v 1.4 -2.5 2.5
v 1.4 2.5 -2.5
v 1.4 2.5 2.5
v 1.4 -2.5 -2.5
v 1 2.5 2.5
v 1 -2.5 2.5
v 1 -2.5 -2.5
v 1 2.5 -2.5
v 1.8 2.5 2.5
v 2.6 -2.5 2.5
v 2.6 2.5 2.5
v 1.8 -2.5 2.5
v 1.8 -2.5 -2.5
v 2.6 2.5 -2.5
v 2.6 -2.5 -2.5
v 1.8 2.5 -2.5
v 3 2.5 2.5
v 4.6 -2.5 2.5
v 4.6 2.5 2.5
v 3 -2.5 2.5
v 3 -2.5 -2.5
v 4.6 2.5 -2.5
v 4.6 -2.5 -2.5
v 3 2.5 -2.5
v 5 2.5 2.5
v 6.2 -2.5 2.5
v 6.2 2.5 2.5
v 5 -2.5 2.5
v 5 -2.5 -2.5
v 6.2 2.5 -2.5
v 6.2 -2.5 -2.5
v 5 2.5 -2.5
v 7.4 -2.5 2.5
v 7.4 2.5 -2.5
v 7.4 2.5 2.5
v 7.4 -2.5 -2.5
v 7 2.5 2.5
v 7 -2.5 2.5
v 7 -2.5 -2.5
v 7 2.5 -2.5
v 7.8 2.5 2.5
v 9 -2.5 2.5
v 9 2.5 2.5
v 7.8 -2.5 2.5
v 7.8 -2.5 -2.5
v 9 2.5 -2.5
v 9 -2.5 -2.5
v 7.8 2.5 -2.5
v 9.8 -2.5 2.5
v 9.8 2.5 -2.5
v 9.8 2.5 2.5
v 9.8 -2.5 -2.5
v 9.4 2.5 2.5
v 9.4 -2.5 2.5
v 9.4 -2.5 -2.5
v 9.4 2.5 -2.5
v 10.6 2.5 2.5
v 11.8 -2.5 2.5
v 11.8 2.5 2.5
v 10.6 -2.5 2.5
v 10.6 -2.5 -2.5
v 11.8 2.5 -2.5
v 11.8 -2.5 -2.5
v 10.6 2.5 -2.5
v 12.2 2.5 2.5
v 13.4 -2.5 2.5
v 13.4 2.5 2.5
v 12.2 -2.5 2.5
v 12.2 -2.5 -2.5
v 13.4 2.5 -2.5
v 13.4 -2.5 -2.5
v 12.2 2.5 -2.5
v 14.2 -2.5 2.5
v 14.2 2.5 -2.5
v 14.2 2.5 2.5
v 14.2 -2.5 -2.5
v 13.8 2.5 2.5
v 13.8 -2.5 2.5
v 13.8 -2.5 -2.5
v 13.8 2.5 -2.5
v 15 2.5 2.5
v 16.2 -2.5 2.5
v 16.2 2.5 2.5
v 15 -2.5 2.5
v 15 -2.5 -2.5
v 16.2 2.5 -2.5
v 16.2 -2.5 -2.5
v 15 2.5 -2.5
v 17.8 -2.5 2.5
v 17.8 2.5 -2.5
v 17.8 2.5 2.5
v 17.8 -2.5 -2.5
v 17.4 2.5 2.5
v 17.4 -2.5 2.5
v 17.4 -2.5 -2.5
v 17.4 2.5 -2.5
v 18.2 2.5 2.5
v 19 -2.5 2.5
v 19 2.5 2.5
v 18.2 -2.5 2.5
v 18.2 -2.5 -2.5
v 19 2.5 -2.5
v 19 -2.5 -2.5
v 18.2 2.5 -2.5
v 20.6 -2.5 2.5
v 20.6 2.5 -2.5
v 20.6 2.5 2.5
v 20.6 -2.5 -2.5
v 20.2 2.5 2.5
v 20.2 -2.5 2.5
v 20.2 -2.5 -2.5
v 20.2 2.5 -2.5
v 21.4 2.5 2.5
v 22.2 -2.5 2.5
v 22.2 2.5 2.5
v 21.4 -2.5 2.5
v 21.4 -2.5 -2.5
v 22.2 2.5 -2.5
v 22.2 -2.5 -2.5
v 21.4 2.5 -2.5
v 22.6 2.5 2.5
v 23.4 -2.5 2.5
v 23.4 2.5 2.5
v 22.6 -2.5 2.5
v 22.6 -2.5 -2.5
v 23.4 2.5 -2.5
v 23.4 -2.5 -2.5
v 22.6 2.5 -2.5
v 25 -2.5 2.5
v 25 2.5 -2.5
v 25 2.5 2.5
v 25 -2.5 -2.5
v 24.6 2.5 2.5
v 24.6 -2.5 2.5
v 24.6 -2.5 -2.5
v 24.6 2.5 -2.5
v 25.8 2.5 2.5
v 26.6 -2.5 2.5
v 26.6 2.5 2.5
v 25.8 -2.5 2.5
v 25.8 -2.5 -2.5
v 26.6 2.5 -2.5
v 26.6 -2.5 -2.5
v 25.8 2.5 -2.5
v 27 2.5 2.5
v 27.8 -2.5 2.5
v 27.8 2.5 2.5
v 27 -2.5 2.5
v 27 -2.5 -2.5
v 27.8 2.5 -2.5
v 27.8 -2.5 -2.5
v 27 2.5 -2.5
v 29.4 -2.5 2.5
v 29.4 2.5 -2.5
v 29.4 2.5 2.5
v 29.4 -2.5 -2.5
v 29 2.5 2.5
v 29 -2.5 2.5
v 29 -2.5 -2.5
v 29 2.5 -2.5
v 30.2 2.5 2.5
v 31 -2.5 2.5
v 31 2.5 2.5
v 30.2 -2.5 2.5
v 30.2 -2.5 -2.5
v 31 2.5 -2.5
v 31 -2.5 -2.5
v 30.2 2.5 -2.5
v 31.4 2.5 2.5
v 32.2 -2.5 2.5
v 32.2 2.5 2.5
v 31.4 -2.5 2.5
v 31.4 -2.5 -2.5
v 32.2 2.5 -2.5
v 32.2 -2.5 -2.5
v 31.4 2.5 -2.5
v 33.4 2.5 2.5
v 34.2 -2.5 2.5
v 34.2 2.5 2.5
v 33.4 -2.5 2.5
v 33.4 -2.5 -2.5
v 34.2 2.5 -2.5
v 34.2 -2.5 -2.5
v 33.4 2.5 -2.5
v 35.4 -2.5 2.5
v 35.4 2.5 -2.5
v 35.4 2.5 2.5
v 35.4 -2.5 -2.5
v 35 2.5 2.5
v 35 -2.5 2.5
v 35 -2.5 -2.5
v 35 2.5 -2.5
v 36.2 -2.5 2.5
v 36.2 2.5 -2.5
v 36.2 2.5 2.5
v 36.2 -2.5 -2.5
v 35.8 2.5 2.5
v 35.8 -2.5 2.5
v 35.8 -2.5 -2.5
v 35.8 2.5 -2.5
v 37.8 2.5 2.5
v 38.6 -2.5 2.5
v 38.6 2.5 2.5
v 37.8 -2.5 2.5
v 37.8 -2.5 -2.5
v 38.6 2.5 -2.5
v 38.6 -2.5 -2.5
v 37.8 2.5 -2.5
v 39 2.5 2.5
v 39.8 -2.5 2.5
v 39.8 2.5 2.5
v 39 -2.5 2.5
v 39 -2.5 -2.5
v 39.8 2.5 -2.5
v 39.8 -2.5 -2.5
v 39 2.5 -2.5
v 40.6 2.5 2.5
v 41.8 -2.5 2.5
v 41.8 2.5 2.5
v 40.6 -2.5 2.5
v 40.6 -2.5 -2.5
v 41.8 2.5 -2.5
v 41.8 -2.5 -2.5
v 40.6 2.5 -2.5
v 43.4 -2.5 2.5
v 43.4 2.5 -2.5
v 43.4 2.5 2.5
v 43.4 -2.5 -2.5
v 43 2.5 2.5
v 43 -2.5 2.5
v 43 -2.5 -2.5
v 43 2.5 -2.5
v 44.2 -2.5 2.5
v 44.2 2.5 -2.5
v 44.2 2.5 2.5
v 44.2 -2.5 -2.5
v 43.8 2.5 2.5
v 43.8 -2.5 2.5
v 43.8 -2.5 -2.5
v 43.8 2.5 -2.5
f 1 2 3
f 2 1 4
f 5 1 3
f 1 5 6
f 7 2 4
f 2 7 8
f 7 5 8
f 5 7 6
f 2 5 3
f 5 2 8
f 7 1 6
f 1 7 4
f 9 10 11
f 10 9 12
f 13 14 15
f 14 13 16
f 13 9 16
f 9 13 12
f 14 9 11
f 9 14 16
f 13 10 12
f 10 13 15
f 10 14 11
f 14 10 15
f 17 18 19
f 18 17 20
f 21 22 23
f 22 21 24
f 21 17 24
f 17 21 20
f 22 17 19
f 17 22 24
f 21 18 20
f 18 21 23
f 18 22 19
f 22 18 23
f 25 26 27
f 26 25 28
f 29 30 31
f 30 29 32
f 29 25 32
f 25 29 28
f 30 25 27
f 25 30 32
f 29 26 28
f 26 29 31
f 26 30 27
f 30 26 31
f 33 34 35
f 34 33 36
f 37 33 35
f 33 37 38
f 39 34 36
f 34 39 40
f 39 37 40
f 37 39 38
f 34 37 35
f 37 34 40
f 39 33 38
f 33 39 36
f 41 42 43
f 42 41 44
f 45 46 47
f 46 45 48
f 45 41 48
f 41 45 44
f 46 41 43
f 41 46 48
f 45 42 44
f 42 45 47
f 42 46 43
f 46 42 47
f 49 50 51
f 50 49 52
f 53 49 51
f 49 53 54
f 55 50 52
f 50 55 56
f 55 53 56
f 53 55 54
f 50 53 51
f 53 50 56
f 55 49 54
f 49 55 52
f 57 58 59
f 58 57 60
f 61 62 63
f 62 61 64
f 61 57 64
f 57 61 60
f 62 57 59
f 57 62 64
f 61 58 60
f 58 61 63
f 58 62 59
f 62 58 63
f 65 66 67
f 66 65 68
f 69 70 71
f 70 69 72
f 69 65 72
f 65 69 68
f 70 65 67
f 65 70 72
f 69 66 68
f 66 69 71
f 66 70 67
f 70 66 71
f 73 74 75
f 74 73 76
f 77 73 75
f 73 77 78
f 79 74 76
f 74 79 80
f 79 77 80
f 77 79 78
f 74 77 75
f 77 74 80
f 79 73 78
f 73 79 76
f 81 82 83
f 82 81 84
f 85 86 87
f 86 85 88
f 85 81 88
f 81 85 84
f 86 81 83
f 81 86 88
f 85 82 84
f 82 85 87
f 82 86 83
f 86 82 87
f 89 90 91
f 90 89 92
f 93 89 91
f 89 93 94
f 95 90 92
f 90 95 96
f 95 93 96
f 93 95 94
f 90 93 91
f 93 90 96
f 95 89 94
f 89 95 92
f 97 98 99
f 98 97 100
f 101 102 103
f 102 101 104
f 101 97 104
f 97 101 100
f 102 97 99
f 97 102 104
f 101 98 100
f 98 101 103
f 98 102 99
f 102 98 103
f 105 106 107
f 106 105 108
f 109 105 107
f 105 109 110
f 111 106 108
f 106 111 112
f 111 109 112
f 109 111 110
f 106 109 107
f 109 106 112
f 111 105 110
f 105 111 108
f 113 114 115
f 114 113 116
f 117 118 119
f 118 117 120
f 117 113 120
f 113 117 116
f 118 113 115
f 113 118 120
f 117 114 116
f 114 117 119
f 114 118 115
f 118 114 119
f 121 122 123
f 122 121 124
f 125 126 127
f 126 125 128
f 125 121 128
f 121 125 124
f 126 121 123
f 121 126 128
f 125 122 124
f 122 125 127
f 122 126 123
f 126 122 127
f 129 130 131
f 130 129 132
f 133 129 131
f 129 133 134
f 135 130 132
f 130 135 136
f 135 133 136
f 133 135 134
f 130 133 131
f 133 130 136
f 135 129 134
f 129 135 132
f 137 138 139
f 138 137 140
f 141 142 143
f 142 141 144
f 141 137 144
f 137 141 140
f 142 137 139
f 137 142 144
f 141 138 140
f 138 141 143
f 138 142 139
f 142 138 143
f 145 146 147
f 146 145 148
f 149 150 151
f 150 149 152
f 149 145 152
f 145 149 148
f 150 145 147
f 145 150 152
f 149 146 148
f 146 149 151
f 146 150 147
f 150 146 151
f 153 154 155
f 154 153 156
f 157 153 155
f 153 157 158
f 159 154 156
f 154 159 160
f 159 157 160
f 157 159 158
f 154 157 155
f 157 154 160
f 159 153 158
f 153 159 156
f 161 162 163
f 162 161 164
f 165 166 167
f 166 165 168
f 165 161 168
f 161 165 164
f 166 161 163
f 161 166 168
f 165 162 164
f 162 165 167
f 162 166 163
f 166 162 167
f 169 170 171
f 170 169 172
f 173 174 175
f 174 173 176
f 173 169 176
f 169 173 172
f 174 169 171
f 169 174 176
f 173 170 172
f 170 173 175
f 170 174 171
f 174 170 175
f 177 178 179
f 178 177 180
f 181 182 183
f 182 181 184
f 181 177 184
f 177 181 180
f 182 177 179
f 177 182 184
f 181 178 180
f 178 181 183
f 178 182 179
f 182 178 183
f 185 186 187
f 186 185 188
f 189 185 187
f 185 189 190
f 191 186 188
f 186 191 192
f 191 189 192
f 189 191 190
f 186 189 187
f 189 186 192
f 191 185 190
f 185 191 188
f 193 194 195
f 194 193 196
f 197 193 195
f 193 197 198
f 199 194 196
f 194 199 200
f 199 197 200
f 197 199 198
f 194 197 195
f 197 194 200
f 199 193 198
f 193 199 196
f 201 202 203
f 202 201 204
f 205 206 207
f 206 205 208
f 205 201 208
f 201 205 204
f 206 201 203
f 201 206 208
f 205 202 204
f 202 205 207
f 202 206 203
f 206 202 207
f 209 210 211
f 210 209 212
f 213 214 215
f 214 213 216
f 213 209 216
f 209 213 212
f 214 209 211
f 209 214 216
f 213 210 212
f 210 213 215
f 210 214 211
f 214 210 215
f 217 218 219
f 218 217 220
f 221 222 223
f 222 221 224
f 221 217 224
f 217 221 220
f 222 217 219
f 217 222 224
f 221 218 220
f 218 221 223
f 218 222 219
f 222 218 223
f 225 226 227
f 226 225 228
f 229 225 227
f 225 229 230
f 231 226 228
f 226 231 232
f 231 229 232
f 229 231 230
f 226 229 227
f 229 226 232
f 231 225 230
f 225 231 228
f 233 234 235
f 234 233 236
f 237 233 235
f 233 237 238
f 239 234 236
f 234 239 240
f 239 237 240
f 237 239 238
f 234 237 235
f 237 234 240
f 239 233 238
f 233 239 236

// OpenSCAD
translate([1.2,0,0])  cube(size = [0.4,5,5], center=true);
translate([2,0,0])  cube(size = [0.4,5,5], center=true);
translate([2.4,0,0])  cube(size = [0.4,5,5], center=true);
translate([3.2,0,0])  cube(size = [0.4,5,5], center=true);
translate([3.6,0,0])  cube(size = [0.4,5,5], center=true);
translate([4,0,0])  cube(size = [0.4,5,5], center=true);
translate([4.4,0,0])  cube(size = [0.4,5,5], center=true);
translate([5.2,0,0])  cube(size = [0.4,5,5], center=true);
translate([5.6,0,0])  cube(size = [0.4,5,5], center=true);
translate([6,0,0])  cube(size = [0.4,5,5], center=true);
translate([7.2,0,0])  cube(size = [0.4,5,5], center=true);
translate([8,0,0])  cube(size = [0.4,5,5], center=true);
translate([8.4,0,0])  cube(size = [0.4,5,5], center=true);
translate([8.8,0,0])  cube(size = [0.4,5,5], center=true);
translate([9.6,0,0])  cube(size = [0.4,5,5], center=true);
translate([10.8,0,0])  cube(size = [0.4,5,5], center=true);
translate([11.2,0,0])  cube(size = [0.4,5,5], center=true);
translate([11.6,0,0])  cube(size = [0.4,5,5], center=true);
translate([12.4,0,0])  cube(size = [0.4,5,5], center=true);
translate([12.8,0,0])  cube(size = [0.4,5,5], center=true);
translate([13.2,0,0])  cube(size = [0.4,5,5], center=true);
translate([14,0,0])  cube(size = [0.4,5,5], center=true);
translate([15.2,0,0])  cube(size = [0.4,5,5], center=true);
translate([15.6,0,0])  cube(size = [0.4,5,5], center=true);
translate([16,0,0])  cube(size = [0.4,5,5], center=true);
translate([17.6,0,0])  cube(size = [0.4,5,5], center=true);
translate([18.4,0,0])  cube(size = [0.4,5,5], center=true);
translate([18.8,0,0])  cube(size = [0.4,5,5], center=true);
translate([20.4,0,0])  cube(size = [0.4,5,5], center=true);
translate([21.6,0,0])  cube(size = [0.4,5,5], center=true);
translate([22,0,0])  cube(size = [0.4,5,5], center=true);
translate([22.8,0,0])  cube(size = [0.4,5,5], center=true);
translate([23.2,0,0])  cube(size = [0.4,5,5], center=true);
translate([24.8,0,0])  cube(size = [0.4,5,5], center=true);
translate([26,0,0])  cube(size = [0.4,5,5], center=true);
translate([26.4,0,0])  cube(size = [0.4,5,5], center=true);
translate([27.2,0,0])  cube(size = [0.4,5,5], center=true);
translate([27.6,0,0])  cube(size = [0.4,5,5], center=true);
translate([29.2,0,0])  cube(size = [0.4,5,5], center=true);
translate([30.4,0,0])  cube(size = [0.4,5,5], center=true);
translate([30.8,0,0])  cube(size = [0.4,5,5], center=true);
translate([31.6,0,0])  cube(size = [0.4,5,5], center=true);
translate([32,0,0])  cube(size = [0.4,5,5], center=true);
translate([33.6,0,0])  cube(size = [0.4,5,5], center=true);
translate([34,0,0])  cube(size = [0.4,5,5], center=true);
translate([35.2,0,0])  cube(size = [0.4,5,5], center=true);
translate([36,0,0])  cube(size = [0.4,5,5], center=true);
translate([38,0,0])  cube(size = [0.4,5,5], center=true);
translate([38.4,0,0])  cube(size = [0.4,5,5], center=true);
translate([39.2,0,0])  cube(size = [0.4,5,5], center=true);
translate([39.6,0,0])  cube(size = [0.4,5,5], center=true);
translate([40.8,0,0])  cube(size = [0.4,5,5], center=true);
translate([41.2,0,0])  cube(size = [0.4,5,5], center=true);
translate([41.6,0,0])  cube(size = [0.4,5,5], center=true);
translate([43.2,0,0])  cube(size = [0.4,5,5], center=true);
translate([44,0,0])  cube(size = [0.4,5,5], center=true);
